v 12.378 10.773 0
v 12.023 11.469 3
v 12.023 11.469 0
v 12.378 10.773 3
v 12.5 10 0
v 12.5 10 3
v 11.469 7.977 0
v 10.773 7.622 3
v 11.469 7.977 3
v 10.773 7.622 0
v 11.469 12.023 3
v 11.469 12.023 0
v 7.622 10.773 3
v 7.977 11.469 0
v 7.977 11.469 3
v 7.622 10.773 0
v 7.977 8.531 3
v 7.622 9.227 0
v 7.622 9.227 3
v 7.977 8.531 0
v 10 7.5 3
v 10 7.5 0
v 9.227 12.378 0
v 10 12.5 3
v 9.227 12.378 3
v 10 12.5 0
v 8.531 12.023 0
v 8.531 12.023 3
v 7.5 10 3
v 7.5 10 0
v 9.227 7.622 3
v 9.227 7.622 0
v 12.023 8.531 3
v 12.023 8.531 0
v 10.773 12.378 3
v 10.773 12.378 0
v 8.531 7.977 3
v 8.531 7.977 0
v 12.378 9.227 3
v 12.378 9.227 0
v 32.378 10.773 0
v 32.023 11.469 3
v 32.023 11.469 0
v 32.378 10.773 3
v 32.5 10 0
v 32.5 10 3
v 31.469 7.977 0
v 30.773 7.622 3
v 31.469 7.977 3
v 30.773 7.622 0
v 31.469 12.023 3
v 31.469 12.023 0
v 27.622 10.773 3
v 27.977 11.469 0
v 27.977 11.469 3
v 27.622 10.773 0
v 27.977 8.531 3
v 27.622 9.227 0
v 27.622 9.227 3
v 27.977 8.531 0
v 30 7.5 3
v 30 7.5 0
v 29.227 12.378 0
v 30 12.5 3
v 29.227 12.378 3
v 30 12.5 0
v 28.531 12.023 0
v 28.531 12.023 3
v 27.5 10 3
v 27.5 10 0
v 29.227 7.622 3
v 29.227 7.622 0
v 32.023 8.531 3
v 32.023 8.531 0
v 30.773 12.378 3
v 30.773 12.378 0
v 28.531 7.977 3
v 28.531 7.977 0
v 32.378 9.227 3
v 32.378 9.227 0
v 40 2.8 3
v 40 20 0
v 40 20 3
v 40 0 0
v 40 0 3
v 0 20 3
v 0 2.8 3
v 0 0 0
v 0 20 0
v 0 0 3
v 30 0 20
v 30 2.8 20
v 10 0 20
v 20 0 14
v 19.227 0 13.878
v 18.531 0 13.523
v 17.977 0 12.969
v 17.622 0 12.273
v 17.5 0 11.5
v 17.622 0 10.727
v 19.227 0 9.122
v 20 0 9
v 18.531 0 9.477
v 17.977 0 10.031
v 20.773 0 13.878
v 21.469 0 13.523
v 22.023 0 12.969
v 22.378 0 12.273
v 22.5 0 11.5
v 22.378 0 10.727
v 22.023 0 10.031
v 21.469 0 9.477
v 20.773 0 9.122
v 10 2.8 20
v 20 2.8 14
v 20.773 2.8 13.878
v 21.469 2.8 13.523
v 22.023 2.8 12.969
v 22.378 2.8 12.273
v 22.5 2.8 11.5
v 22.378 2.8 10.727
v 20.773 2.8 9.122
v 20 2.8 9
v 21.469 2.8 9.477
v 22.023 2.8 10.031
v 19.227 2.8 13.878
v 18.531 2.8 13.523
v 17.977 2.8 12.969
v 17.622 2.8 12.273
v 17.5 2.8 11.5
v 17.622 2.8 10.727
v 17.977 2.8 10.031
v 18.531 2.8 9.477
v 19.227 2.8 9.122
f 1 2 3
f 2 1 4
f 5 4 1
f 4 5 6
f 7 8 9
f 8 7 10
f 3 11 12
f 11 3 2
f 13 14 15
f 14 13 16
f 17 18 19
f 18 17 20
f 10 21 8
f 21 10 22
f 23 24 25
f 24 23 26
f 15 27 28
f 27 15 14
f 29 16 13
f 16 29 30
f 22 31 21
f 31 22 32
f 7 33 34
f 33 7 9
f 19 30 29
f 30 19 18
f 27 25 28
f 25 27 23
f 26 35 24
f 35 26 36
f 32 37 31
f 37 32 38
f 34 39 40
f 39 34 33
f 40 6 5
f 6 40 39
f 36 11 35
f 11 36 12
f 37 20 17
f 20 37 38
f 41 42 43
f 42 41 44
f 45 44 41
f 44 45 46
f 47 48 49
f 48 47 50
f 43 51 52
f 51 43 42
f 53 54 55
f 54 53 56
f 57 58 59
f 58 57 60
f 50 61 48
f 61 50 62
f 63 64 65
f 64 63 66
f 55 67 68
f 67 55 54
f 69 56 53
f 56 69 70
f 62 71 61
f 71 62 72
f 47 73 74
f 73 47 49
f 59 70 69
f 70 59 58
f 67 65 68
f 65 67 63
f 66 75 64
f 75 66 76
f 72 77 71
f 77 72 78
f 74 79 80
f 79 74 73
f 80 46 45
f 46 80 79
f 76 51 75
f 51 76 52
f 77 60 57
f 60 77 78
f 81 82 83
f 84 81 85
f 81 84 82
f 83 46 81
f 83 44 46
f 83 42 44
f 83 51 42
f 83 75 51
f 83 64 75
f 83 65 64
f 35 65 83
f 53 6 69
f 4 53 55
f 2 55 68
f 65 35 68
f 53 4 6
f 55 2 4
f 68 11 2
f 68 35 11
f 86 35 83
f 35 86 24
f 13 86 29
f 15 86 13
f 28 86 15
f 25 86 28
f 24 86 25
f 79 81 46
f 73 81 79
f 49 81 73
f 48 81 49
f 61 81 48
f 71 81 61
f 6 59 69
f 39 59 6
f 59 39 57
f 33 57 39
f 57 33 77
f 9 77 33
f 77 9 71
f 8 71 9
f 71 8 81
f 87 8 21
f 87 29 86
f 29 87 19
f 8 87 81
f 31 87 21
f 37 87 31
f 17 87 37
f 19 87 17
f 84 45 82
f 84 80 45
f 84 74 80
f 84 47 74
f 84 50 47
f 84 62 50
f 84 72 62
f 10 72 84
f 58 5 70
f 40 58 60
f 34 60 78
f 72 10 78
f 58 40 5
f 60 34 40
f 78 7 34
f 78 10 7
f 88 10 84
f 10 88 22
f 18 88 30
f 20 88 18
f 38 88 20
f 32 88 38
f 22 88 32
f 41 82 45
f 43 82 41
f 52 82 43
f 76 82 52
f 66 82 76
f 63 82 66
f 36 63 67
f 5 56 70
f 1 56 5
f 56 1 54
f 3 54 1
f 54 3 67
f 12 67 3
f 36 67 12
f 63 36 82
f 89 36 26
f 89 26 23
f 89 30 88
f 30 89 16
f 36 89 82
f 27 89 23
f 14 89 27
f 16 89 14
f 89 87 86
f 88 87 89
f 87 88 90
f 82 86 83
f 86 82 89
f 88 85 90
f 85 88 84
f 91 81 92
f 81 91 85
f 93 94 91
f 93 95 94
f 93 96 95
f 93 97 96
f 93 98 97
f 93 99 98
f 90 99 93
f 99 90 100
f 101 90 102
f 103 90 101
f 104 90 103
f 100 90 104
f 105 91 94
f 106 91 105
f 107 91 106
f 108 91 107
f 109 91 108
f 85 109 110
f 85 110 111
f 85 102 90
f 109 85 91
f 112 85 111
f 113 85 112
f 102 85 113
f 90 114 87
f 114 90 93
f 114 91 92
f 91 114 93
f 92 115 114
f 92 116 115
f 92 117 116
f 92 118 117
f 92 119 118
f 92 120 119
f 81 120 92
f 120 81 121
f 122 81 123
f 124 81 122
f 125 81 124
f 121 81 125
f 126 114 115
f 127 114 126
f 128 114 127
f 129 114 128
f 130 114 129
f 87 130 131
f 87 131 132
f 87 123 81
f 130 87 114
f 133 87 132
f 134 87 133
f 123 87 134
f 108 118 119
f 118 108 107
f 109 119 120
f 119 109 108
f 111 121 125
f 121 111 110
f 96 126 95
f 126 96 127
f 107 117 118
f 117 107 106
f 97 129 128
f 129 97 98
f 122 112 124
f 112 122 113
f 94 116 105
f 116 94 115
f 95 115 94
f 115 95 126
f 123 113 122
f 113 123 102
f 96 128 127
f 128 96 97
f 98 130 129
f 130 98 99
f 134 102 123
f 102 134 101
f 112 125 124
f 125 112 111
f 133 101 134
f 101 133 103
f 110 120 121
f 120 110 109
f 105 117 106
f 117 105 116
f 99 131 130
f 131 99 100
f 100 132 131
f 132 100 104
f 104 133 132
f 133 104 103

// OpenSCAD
//1X2AB

//variables
//base
xBase = 40;
yBase = 20;
zBase = 3;

dBaseHoles = 5;
hBaseHoles = zBase*3;

xBaseHolePosition = 7.5 + dBaseHoles/2;
differenceBaseHoles = 15;

//lateral
xLateral = 40;
yLateral = 2.8;
zLateral = 17;
xLateralSuperior = 20;
xMargin = (xLateral-xLateralSuperior)/2;


//modules
module body(){
    union(){
        base();
        translate([0,yLateral,zBase])
            lateral();
    }
}

module base(){
    difference(){
        cube([xBase,yBase,zBase]);
        baseHoles();
    }
}

module baseHoles(){
    translate([xBaseHolePosition,yBase/2,0])
        cylinder(h=hBaseHoles, d=dBaseHoles, center=true, $fn=20);
    translate([xBaseHolePosition+differenceBaseHoles+dBaseHoles,yBase/2,0])
        cylinder(h=hBaseHoles, d=dBaseHoles, center=true, $fn=20);
}

module lateral(){
    difference(){
        rotate([90,0,0])
        linear_extrude(height=yLateral){
            polygon(points=[[0,0],[xLateral,0],[xMargin+xLateralSuperior,zLateral],[xMargin,zLateral]]);
        }
        translate([xLateral/2,0,zLateral/2])
            rotate([90,0,0])
                cylinder(h=hBaseHoles,d=dBaseHoles,center=true,$fn=20);    
    }
}

body();
